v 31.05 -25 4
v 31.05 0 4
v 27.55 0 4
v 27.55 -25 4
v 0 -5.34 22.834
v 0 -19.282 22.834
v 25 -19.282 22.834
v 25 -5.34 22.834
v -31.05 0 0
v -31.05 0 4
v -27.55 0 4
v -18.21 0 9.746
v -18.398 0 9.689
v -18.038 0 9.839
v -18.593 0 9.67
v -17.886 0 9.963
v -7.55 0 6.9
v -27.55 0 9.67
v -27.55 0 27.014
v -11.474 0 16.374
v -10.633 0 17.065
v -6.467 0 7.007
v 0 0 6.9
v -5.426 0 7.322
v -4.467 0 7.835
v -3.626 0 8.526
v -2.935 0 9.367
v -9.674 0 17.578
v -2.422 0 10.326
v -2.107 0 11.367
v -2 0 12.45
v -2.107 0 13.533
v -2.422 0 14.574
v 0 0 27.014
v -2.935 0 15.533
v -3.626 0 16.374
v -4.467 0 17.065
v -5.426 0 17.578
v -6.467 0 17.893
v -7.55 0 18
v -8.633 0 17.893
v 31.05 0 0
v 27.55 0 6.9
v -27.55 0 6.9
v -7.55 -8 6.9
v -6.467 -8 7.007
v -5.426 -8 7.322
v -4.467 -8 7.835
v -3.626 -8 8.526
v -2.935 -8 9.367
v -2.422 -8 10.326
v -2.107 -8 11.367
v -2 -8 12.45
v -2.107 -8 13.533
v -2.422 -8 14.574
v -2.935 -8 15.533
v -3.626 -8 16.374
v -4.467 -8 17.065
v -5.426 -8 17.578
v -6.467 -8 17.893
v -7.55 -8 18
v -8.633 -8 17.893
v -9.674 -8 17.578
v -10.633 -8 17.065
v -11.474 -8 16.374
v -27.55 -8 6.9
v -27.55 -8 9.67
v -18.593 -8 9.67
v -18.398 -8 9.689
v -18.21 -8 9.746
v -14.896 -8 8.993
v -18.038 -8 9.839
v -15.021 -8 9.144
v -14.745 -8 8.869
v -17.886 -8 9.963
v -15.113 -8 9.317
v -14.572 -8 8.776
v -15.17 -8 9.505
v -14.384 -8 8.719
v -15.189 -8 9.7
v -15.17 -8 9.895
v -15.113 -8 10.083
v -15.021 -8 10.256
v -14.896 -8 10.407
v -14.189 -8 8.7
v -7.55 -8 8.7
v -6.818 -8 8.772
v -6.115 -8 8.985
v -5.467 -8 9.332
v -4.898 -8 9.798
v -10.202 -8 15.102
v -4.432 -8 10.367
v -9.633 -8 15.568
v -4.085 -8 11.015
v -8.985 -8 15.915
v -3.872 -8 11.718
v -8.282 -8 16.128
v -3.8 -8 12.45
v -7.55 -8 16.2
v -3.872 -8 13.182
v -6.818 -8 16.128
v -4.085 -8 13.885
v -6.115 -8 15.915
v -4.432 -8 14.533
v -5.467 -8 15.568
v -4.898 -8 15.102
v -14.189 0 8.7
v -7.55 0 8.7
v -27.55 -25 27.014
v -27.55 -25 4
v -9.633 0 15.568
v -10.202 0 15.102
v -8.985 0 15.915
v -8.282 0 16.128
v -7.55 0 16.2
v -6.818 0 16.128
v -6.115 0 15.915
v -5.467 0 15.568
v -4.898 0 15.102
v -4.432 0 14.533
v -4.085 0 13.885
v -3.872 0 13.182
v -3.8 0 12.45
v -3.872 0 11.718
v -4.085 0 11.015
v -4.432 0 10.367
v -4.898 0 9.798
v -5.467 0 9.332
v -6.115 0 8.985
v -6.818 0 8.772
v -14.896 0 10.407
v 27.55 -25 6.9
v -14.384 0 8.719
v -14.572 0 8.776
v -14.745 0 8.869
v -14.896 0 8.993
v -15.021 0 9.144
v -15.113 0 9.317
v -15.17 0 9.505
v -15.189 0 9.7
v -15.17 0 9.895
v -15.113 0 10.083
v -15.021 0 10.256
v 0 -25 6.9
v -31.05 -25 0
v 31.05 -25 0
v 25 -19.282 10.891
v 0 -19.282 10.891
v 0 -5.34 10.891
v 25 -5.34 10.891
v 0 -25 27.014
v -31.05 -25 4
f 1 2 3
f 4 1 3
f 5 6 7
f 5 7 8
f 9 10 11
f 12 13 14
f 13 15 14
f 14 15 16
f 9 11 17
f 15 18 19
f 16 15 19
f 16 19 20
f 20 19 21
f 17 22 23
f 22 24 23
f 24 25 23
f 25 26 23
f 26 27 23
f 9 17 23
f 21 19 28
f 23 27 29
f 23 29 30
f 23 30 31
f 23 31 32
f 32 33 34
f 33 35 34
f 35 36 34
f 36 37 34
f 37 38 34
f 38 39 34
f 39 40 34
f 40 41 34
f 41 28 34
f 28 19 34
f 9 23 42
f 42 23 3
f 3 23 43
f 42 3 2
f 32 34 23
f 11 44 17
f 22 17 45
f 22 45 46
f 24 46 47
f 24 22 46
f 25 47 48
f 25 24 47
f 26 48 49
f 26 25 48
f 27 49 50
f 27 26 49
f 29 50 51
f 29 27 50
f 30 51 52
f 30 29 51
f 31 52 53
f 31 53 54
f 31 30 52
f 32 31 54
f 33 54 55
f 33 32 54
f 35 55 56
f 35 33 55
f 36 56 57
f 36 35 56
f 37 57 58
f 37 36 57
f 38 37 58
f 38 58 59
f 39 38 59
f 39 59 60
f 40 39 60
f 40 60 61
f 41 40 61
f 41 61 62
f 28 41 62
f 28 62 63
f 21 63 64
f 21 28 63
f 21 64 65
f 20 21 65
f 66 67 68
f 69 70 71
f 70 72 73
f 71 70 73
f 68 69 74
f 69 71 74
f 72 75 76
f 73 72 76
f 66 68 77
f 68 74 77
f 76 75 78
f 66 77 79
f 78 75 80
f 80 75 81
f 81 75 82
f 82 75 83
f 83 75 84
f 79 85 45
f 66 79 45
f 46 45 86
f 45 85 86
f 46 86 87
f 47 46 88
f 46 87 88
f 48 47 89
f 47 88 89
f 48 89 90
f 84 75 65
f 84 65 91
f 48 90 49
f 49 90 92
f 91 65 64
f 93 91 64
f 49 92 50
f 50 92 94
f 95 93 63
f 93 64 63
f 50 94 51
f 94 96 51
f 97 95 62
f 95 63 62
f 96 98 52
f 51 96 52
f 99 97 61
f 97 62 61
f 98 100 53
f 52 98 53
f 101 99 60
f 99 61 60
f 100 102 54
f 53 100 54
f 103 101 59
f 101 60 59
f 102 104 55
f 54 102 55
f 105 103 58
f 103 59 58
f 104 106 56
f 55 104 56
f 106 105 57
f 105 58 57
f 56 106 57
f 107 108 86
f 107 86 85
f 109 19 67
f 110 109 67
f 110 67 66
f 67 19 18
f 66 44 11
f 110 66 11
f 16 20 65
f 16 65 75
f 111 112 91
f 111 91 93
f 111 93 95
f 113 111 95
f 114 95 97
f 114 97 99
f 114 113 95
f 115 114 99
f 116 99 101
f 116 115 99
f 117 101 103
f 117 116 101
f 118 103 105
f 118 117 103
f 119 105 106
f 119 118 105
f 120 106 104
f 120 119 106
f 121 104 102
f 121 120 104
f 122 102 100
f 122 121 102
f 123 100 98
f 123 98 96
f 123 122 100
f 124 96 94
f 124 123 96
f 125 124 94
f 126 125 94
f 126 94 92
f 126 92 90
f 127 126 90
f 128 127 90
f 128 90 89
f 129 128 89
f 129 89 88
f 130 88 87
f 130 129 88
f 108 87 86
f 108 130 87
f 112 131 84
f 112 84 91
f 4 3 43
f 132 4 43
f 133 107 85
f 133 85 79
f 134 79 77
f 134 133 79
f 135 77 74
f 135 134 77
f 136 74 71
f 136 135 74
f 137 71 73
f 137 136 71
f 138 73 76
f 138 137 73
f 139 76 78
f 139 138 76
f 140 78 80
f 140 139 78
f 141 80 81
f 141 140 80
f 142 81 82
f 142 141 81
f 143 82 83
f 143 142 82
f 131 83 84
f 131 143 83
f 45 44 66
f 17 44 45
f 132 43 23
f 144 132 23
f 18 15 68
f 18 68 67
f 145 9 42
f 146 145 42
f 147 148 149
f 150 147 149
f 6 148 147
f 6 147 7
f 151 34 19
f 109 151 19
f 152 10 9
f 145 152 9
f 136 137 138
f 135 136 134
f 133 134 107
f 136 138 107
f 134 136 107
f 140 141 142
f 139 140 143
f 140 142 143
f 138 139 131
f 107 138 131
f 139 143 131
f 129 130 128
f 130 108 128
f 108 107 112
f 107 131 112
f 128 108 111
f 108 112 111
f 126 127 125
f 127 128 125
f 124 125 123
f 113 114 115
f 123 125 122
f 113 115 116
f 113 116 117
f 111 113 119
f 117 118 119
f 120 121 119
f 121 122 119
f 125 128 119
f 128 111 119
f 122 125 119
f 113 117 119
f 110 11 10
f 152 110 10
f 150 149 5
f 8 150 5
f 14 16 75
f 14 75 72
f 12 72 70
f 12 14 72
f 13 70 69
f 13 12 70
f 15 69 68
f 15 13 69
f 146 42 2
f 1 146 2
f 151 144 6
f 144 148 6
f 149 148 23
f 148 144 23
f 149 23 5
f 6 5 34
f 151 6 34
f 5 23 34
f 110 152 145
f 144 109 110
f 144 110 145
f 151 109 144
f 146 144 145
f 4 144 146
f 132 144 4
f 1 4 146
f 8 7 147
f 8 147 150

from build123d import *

# Parameters (mm, degrees)
F1_DEPTH = 25
F2_DEPTH = 8
F3_W     = 13.941449
F3_H     = 11.943896
F4_DEPTH = 25


with BuildPart() as f1:
    # F0 (on Front) → F1 (new body)
    with BuildSketch(Plane.XZ):
        with BuildLine():
            Line((-31.05, 4), (-31.05, 0))
            Line((-31.05, 0), (31.05, 0))
            Line((31.05, 0), (31.05, 4))
            Line((31.05, 4), (27.55, 4))
            Line((27.55, 4), (27.55, 6.9))
            Line((27.55, 6.9), (0, 6.9))
            Line((0, 6.9), (0, 27.01417))
            Line((0, 27.01417), (-27.55, 27.01417))
            Line((-27.55, 27.01417), (-27.55, 9.67))
            Line((-27.55, 9.67), (-18.593099, 9.67))
            ThreePointArc((-18.593099, 9.67), (-18.210415, 9.74612), (-17.885992, 9.962893))
            Line((-17.885992, 9.962893), (-11.474443, 16.374443))
            ThreePointArc((-11.474443, 16.374443), (-2.422469, 14.573893), (-7.55, 6.9))
            Line((-7.55, 6.9), (-27.55, 6.9))
            Line((-27.55, 6.9), (-27.55, 4))
            Line((-27.55, 4), (-31.05, 4))
        make_face()
        with BuildLine():
            Line((-27.55, 9.67), (-27.55, 6.9))
            Line((-27.55, 6.9), (-7.55, 6.9))
            ThreePointArc((-7.55, 6.9), (-2.422469, 14.573893), (-11.474443, 16.374443))
            Line((-11.474443, 16.374443), (-17.885992, 9.962893))
            ThreePointArc((-17.885992, 9.962893), (-18.210415, 9.74612), (-18.593099, 9.67))
            Line((-18.593099, 9.67), (-27.55, 9.67))
        make_face()
        with BuildLine():
            Line((-7.55, 8.7), (-14.189087, 8.7))
            ThreePointArc((-14.189087, 8.7), (-15.112967, 9.317317), (-14.896194, 10.407107))
            Line((-14.896194, 10.407107), (-10.20165, 15.10165))
            ThreePointArc((-10.20165, 15.10165), (-4.085452, 13.885063), (-7.55, 8.7))
        make_face(mode=Mode.SUBTRACT)
        with BuildLine():
            ThreePointArc((-14.896194, 10.407107), (-15.112967, 9.317317), (-14.189087, 8.7))
            Line((-14.189087, 8.7), (-7.55, 8.7))
            ThreePointArc((-7.55, 8.7), (-4.085452, 13.885063), (-10.20165, 15.10165))
            Line((-10.20165, 15.10165), (-14.896194, 10.407107))
        make_face()
    extrude(amount=F1_DEPTH)

    # F0 (on Front) → F2 (cut)
    with BuildSketch(Plane.XZ):
        with BuildLine():
            Line((-27.55, 9.67), (-27.55, 6.9))
            Line((-27.55, 6.9), (-7.55, 6.9))
            ThreePointArc((-7.55, 6.9), (-2.422469, 14.573893), (-11.474443, 16.374443))
            Line((-11.474443, 16.374443), (-17.885992, 9.962893))
            ThreePointArc((-17.885992, 9.962893), (-18.210415, 9.74612), (-18.593099, 9.67))
            Line((-18.593099, 9.67), (-27.55, 9.67))
        make_face()
        with BuildLine():
            Line((-7.55, 8.7), (-14.189087, 8.7))
            ThreePointArc((-14.189087, 8.7), (-15.112967, 9.317317), (-14.896194, 10.407107))
            Line((-14.896194, 10.407107), (-10.20165, 15.10165))
            ThreePointArc((-10.20165, 15.10165), (-4.085452, 13.885063), (-7.55, 8.7))
        make_face(mode=Mode.SUBTRACT)
    extrude(amount=F2_DEPTH, mode=Mode.SUBTRACT)

    # F3 (on face) → F4 (join)
    with BuildSketch(Plane.YZ):
        with Locations((-12.311068, 16.862532)):
            Rectangle(F3_W, F3_H)
    extrude(amount=F4_DEPTH)


solid = f1.part
